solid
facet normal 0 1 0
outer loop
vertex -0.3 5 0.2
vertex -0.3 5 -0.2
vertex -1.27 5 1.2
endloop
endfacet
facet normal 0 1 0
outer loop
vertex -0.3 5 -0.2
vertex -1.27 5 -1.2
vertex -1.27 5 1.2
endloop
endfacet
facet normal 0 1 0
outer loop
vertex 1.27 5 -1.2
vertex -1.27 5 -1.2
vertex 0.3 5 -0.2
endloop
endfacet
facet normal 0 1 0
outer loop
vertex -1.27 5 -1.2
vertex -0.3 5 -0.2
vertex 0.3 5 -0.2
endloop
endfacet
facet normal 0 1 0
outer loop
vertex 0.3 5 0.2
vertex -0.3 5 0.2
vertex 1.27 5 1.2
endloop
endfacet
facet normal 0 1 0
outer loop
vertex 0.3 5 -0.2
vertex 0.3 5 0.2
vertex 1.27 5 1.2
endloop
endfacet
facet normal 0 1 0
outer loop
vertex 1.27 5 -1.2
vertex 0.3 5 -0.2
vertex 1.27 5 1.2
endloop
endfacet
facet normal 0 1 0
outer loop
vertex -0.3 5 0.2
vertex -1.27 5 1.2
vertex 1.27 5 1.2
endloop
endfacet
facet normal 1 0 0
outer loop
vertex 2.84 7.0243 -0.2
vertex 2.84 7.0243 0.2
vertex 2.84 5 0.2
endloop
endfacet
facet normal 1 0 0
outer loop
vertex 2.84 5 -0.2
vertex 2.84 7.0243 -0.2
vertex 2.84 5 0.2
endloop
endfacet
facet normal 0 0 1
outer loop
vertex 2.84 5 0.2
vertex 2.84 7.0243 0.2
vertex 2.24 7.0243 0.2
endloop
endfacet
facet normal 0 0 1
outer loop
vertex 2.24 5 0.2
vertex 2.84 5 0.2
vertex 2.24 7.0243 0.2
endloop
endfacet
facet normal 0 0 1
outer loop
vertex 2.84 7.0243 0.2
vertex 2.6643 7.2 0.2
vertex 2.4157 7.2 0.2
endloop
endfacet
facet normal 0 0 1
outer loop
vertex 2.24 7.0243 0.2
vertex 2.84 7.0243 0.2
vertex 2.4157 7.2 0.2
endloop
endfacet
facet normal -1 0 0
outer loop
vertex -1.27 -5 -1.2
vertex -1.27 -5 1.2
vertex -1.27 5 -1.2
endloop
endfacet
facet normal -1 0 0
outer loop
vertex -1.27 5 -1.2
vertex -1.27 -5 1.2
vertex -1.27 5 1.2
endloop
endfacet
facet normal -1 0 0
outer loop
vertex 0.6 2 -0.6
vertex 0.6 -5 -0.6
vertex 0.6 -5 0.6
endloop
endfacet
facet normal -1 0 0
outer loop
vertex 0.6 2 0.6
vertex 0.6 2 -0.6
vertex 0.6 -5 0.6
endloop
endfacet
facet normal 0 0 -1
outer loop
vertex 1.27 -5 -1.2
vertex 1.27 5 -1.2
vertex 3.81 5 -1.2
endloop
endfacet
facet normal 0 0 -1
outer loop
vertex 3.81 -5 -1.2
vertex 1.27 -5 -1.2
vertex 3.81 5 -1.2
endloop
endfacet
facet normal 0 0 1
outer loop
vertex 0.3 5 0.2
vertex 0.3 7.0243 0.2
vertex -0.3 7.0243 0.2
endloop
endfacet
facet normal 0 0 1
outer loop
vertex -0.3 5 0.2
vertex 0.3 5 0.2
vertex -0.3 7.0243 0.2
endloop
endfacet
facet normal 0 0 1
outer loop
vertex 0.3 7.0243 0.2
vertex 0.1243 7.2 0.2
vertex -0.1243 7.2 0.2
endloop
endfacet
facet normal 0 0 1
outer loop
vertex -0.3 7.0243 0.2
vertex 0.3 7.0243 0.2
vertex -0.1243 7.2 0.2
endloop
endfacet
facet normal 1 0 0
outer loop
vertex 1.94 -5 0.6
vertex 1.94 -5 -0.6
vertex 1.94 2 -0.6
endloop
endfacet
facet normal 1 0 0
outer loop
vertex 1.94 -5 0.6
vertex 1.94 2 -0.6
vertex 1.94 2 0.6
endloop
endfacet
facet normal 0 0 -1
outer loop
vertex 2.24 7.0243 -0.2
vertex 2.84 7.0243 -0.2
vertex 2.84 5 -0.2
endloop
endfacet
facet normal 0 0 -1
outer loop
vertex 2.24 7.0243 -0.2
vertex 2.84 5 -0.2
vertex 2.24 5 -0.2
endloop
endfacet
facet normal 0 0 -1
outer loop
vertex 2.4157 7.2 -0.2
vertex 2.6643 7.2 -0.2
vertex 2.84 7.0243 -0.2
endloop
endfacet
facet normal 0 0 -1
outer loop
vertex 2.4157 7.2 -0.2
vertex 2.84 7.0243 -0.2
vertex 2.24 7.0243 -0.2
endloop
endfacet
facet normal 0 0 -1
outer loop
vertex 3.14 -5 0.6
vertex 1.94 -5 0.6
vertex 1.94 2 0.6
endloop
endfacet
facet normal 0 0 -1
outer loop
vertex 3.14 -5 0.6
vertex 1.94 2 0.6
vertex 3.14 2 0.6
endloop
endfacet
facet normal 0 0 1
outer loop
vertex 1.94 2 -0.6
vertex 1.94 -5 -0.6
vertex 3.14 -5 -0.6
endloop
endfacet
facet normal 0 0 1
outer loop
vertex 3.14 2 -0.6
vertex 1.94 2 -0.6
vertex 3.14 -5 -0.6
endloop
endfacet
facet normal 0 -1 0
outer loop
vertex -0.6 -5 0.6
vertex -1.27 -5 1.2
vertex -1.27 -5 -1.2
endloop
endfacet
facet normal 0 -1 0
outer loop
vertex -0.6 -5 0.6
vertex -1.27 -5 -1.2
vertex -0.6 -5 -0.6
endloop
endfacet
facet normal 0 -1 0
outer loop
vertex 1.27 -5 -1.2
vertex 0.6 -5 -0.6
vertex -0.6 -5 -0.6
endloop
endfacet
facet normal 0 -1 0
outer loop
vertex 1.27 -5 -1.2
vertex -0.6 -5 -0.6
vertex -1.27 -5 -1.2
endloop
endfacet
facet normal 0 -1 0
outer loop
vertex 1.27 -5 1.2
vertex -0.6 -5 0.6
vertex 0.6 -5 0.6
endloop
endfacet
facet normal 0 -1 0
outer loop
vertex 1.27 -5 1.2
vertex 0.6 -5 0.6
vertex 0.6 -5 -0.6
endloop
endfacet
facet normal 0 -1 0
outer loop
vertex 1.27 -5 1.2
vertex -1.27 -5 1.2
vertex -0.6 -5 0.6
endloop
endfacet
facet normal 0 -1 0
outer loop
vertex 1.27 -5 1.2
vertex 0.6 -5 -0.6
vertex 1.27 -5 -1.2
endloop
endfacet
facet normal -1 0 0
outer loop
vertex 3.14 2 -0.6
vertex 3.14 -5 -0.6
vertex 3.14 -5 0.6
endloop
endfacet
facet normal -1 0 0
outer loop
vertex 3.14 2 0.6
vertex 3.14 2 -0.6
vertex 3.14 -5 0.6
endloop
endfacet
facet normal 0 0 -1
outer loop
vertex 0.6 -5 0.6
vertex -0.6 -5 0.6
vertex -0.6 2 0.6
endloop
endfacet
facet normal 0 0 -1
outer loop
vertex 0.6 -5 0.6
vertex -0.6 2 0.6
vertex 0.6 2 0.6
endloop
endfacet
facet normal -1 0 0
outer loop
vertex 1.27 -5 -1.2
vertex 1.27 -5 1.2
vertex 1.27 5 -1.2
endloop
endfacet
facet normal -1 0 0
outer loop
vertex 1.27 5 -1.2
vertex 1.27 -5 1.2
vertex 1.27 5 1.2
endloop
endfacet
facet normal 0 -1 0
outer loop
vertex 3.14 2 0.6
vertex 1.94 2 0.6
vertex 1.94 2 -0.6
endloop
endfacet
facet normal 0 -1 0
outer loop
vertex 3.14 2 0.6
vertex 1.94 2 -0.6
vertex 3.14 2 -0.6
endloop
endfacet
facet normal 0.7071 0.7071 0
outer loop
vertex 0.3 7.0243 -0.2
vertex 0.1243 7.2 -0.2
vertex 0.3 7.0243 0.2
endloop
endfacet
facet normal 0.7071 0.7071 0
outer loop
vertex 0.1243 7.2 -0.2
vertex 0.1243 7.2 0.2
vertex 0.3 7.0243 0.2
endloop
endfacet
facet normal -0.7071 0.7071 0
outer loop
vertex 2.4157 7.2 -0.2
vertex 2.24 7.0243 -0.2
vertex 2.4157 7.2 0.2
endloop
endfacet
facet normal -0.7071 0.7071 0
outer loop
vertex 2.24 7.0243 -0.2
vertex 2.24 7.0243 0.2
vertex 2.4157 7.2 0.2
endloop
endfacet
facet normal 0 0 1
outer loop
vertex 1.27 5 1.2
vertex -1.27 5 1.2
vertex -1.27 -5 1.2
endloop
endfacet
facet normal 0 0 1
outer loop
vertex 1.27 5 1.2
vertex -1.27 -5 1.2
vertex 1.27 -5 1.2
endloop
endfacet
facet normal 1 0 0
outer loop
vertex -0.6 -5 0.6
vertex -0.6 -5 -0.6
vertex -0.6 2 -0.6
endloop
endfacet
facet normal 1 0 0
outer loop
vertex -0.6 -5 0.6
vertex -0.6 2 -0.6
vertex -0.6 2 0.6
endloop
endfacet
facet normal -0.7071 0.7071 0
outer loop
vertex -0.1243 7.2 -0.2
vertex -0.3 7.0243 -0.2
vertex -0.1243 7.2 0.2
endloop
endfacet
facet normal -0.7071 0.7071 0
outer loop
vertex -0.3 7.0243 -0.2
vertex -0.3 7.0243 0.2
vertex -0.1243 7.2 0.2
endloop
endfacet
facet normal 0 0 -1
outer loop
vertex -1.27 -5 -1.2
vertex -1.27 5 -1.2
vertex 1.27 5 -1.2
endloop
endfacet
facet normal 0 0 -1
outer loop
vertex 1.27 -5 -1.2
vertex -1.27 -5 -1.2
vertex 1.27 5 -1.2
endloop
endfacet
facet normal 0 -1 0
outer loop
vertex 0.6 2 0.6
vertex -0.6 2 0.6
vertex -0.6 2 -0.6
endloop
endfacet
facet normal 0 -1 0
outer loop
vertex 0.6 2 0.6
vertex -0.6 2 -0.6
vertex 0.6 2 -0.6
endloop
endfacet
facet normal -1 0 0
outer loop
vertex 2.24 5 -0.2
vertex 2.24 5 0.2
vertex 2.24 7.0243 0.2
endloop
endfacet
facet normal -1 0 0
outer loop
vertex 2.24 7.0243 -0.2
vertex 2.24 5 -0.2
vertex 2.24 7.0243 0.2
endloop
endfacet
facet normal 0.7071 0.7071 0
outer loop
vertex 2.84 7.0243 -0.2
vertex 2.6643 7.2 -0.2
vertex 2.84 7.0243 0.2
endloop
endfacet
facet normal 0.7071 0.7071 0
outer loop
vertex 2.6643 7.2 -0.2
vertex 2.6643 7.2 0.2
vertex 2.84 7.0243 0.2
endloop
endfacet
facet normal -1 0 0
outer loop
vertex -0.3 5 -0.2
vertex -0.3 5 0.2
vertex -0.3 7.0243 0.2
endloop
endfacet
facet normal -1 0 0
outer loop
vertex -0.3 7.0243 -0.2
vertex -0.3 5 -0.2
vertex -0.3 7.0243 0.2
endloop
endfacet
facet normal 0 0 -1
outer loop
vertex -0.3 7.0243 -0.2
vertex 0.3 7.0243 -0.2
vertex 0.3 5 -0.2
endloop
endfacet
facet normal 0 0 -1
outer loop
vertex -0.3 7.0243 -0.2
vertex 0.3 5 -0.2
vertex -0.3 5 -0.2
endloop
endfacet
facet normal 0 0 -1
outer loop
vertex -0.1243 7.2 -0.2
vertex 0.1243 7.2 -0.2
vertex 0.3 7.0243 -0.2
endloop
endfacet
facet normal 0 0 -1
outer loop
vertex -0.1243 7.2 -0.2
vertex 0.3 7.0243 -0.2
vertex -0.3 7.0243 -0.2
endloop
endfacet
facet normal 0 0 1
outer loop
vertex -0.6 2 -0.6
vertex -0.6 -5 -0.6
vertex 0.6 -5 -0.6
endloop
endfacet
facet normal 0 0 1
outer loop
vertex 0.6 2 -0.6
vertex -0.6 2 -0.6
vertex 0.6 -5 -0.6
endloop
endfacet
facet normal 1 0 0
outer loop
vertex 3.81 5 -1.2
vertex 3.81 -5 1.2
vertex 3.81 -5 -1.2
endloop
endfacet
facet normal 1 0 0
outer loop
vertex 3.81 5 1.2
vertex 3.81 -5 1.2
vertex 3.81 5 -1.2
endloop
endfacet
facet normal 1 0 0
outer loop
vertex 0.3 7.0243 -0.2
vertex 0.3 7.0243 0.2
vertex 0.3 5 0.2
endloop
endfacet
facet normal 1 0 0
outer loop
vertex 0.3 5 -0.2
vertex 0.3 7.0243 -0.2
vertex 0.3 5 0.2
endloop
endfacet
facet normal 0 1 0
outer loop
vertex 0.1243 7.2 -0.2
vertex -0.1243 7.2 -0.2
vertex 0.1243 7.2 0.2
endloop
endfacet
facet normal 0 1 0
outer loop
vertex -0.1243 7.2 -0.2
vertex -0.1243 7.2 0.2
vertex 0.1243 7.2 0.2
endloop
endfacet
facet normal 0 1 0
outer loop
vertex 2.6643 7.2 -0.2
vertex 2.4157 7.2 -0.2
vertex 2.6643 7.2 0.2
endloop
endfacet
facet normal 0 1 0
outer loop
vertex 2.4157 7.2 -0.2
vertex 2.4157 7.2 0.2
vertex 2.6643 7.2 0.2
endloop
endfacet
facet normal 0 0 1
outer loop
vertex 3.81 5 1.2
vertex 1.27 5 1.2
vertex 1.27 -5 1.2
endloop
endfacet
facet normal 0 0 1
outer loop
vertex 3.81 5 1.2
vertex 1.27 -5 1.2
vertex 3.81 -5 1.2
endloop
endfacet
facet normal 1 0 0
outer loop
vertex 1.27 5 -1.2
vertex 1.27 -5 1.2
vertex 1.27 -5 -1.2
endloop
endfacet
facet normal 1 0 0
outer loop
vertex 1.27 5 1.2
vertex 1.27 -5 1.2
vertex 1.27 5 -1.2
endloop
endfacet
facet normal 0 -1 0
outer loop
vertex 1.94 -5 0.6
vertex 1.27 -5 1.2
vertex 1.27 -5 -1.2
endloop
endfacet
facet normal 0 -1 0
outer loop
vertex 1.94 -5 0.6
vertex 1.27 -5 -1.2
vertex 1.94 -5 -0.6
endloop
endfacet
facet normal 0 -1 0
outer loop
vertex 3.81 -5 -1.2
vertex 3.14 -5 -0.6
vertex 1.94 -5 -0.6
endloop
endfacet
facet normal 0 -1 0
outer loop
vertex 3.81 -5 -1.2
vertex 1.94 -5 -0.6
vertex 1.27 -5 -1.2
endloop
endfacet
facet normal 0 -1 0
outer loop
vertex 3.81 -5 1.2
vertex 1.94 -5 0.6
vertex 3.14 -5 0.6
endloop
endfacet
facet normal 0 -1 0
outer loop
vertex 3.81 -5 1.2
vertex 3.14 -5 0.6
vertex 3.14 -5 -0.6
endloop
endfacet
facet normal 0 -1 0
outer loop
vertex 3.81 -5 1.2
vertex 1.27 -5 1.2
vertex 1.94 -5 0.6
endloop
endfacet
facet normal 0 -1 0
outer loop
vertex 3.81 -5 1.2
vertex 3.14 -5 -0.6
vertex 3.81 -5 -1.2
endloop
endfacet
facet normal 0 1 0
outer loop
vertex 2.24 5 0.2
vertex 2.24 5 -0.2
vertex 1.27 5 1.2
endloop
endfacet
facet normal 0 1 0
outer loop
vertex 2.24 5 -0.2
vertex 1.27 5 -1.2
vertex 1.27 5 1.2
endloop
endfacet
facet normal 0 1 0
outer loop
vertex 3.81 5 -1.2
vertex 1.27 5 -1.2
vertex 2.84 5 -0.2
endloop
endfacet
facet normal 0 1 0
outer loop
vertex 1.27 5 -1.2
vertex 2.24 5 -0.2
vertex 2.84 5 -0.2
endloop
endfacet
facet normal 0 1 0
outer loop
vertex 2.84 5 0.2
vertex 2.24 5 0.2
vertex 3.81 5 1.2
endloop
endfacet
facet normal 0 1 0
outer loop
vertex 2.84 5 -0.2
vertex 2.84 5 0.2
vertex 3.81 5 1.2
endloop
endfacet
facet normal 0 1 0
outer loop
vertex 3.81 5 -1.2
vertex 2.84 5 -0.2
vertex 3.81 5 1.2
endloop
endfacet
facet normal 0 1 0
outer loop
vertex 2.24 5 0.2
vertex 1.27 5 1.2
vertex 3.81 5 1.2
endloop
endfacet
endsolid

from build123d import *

# Parameters (mm, degrees)
SKETCH1_W           = 2.54
SKETCH1_H           = 10
BOSS_EXTRUDE1_DEPTH = 1.2
SKETCH2_W           = 1.2
SKETCH2_H           = 1.2
CUT_EXTRUDE1_DEPTH  = 7
BOSS_EXTRUDE2_DEPTH = 0.2
LPATTERN1_COUNT     = 2
LPATTERN1_PITCH     = 2.54


with BuildPart() as part:
    # Sketch1 → Boss-Extrude1 (new, symmetric)
    with BuildSketch(Plane.XY):
        Rectangle(SKETCH1_W, SKETCH1_H)
    extrude(amount=BOSS_EXTRUDE1_DEPTH, both=True)

    # Sketch2 → Cut-Extrude1 (cut)
    with BuildSketch(Plane.XZ.offset(5)):
        Rectangle(SKETCH2_W, SKETCH2_H)
    extrude(amount=-CUT_EXTRUDE1_DEPTH, mode=Mode.SUBTRACT)

    # Sketch3 → Boss-Extrude2 (add, symmetric)
    with BuildSketch(Plane.XY):
        Polygon((-0.3, 5), (-0.3, 7.024264069), (-0.124264069, 7.2), (0.124264069, 7.2), (0.3, 7.024264069), (0.3, 5), align=None)
    extrude(amount=BOSS_EXTRUDE2_DEPTH, both=True)


with BuildPart() as lpattern1_1:
    # LPattern1: pattern copy
    add(part.part.moved(Location(Vector(1, 0, 0) * (1 * LPATTERN1_PITCH))))


solid = Compound([part.part, lpattern1_1.part])
